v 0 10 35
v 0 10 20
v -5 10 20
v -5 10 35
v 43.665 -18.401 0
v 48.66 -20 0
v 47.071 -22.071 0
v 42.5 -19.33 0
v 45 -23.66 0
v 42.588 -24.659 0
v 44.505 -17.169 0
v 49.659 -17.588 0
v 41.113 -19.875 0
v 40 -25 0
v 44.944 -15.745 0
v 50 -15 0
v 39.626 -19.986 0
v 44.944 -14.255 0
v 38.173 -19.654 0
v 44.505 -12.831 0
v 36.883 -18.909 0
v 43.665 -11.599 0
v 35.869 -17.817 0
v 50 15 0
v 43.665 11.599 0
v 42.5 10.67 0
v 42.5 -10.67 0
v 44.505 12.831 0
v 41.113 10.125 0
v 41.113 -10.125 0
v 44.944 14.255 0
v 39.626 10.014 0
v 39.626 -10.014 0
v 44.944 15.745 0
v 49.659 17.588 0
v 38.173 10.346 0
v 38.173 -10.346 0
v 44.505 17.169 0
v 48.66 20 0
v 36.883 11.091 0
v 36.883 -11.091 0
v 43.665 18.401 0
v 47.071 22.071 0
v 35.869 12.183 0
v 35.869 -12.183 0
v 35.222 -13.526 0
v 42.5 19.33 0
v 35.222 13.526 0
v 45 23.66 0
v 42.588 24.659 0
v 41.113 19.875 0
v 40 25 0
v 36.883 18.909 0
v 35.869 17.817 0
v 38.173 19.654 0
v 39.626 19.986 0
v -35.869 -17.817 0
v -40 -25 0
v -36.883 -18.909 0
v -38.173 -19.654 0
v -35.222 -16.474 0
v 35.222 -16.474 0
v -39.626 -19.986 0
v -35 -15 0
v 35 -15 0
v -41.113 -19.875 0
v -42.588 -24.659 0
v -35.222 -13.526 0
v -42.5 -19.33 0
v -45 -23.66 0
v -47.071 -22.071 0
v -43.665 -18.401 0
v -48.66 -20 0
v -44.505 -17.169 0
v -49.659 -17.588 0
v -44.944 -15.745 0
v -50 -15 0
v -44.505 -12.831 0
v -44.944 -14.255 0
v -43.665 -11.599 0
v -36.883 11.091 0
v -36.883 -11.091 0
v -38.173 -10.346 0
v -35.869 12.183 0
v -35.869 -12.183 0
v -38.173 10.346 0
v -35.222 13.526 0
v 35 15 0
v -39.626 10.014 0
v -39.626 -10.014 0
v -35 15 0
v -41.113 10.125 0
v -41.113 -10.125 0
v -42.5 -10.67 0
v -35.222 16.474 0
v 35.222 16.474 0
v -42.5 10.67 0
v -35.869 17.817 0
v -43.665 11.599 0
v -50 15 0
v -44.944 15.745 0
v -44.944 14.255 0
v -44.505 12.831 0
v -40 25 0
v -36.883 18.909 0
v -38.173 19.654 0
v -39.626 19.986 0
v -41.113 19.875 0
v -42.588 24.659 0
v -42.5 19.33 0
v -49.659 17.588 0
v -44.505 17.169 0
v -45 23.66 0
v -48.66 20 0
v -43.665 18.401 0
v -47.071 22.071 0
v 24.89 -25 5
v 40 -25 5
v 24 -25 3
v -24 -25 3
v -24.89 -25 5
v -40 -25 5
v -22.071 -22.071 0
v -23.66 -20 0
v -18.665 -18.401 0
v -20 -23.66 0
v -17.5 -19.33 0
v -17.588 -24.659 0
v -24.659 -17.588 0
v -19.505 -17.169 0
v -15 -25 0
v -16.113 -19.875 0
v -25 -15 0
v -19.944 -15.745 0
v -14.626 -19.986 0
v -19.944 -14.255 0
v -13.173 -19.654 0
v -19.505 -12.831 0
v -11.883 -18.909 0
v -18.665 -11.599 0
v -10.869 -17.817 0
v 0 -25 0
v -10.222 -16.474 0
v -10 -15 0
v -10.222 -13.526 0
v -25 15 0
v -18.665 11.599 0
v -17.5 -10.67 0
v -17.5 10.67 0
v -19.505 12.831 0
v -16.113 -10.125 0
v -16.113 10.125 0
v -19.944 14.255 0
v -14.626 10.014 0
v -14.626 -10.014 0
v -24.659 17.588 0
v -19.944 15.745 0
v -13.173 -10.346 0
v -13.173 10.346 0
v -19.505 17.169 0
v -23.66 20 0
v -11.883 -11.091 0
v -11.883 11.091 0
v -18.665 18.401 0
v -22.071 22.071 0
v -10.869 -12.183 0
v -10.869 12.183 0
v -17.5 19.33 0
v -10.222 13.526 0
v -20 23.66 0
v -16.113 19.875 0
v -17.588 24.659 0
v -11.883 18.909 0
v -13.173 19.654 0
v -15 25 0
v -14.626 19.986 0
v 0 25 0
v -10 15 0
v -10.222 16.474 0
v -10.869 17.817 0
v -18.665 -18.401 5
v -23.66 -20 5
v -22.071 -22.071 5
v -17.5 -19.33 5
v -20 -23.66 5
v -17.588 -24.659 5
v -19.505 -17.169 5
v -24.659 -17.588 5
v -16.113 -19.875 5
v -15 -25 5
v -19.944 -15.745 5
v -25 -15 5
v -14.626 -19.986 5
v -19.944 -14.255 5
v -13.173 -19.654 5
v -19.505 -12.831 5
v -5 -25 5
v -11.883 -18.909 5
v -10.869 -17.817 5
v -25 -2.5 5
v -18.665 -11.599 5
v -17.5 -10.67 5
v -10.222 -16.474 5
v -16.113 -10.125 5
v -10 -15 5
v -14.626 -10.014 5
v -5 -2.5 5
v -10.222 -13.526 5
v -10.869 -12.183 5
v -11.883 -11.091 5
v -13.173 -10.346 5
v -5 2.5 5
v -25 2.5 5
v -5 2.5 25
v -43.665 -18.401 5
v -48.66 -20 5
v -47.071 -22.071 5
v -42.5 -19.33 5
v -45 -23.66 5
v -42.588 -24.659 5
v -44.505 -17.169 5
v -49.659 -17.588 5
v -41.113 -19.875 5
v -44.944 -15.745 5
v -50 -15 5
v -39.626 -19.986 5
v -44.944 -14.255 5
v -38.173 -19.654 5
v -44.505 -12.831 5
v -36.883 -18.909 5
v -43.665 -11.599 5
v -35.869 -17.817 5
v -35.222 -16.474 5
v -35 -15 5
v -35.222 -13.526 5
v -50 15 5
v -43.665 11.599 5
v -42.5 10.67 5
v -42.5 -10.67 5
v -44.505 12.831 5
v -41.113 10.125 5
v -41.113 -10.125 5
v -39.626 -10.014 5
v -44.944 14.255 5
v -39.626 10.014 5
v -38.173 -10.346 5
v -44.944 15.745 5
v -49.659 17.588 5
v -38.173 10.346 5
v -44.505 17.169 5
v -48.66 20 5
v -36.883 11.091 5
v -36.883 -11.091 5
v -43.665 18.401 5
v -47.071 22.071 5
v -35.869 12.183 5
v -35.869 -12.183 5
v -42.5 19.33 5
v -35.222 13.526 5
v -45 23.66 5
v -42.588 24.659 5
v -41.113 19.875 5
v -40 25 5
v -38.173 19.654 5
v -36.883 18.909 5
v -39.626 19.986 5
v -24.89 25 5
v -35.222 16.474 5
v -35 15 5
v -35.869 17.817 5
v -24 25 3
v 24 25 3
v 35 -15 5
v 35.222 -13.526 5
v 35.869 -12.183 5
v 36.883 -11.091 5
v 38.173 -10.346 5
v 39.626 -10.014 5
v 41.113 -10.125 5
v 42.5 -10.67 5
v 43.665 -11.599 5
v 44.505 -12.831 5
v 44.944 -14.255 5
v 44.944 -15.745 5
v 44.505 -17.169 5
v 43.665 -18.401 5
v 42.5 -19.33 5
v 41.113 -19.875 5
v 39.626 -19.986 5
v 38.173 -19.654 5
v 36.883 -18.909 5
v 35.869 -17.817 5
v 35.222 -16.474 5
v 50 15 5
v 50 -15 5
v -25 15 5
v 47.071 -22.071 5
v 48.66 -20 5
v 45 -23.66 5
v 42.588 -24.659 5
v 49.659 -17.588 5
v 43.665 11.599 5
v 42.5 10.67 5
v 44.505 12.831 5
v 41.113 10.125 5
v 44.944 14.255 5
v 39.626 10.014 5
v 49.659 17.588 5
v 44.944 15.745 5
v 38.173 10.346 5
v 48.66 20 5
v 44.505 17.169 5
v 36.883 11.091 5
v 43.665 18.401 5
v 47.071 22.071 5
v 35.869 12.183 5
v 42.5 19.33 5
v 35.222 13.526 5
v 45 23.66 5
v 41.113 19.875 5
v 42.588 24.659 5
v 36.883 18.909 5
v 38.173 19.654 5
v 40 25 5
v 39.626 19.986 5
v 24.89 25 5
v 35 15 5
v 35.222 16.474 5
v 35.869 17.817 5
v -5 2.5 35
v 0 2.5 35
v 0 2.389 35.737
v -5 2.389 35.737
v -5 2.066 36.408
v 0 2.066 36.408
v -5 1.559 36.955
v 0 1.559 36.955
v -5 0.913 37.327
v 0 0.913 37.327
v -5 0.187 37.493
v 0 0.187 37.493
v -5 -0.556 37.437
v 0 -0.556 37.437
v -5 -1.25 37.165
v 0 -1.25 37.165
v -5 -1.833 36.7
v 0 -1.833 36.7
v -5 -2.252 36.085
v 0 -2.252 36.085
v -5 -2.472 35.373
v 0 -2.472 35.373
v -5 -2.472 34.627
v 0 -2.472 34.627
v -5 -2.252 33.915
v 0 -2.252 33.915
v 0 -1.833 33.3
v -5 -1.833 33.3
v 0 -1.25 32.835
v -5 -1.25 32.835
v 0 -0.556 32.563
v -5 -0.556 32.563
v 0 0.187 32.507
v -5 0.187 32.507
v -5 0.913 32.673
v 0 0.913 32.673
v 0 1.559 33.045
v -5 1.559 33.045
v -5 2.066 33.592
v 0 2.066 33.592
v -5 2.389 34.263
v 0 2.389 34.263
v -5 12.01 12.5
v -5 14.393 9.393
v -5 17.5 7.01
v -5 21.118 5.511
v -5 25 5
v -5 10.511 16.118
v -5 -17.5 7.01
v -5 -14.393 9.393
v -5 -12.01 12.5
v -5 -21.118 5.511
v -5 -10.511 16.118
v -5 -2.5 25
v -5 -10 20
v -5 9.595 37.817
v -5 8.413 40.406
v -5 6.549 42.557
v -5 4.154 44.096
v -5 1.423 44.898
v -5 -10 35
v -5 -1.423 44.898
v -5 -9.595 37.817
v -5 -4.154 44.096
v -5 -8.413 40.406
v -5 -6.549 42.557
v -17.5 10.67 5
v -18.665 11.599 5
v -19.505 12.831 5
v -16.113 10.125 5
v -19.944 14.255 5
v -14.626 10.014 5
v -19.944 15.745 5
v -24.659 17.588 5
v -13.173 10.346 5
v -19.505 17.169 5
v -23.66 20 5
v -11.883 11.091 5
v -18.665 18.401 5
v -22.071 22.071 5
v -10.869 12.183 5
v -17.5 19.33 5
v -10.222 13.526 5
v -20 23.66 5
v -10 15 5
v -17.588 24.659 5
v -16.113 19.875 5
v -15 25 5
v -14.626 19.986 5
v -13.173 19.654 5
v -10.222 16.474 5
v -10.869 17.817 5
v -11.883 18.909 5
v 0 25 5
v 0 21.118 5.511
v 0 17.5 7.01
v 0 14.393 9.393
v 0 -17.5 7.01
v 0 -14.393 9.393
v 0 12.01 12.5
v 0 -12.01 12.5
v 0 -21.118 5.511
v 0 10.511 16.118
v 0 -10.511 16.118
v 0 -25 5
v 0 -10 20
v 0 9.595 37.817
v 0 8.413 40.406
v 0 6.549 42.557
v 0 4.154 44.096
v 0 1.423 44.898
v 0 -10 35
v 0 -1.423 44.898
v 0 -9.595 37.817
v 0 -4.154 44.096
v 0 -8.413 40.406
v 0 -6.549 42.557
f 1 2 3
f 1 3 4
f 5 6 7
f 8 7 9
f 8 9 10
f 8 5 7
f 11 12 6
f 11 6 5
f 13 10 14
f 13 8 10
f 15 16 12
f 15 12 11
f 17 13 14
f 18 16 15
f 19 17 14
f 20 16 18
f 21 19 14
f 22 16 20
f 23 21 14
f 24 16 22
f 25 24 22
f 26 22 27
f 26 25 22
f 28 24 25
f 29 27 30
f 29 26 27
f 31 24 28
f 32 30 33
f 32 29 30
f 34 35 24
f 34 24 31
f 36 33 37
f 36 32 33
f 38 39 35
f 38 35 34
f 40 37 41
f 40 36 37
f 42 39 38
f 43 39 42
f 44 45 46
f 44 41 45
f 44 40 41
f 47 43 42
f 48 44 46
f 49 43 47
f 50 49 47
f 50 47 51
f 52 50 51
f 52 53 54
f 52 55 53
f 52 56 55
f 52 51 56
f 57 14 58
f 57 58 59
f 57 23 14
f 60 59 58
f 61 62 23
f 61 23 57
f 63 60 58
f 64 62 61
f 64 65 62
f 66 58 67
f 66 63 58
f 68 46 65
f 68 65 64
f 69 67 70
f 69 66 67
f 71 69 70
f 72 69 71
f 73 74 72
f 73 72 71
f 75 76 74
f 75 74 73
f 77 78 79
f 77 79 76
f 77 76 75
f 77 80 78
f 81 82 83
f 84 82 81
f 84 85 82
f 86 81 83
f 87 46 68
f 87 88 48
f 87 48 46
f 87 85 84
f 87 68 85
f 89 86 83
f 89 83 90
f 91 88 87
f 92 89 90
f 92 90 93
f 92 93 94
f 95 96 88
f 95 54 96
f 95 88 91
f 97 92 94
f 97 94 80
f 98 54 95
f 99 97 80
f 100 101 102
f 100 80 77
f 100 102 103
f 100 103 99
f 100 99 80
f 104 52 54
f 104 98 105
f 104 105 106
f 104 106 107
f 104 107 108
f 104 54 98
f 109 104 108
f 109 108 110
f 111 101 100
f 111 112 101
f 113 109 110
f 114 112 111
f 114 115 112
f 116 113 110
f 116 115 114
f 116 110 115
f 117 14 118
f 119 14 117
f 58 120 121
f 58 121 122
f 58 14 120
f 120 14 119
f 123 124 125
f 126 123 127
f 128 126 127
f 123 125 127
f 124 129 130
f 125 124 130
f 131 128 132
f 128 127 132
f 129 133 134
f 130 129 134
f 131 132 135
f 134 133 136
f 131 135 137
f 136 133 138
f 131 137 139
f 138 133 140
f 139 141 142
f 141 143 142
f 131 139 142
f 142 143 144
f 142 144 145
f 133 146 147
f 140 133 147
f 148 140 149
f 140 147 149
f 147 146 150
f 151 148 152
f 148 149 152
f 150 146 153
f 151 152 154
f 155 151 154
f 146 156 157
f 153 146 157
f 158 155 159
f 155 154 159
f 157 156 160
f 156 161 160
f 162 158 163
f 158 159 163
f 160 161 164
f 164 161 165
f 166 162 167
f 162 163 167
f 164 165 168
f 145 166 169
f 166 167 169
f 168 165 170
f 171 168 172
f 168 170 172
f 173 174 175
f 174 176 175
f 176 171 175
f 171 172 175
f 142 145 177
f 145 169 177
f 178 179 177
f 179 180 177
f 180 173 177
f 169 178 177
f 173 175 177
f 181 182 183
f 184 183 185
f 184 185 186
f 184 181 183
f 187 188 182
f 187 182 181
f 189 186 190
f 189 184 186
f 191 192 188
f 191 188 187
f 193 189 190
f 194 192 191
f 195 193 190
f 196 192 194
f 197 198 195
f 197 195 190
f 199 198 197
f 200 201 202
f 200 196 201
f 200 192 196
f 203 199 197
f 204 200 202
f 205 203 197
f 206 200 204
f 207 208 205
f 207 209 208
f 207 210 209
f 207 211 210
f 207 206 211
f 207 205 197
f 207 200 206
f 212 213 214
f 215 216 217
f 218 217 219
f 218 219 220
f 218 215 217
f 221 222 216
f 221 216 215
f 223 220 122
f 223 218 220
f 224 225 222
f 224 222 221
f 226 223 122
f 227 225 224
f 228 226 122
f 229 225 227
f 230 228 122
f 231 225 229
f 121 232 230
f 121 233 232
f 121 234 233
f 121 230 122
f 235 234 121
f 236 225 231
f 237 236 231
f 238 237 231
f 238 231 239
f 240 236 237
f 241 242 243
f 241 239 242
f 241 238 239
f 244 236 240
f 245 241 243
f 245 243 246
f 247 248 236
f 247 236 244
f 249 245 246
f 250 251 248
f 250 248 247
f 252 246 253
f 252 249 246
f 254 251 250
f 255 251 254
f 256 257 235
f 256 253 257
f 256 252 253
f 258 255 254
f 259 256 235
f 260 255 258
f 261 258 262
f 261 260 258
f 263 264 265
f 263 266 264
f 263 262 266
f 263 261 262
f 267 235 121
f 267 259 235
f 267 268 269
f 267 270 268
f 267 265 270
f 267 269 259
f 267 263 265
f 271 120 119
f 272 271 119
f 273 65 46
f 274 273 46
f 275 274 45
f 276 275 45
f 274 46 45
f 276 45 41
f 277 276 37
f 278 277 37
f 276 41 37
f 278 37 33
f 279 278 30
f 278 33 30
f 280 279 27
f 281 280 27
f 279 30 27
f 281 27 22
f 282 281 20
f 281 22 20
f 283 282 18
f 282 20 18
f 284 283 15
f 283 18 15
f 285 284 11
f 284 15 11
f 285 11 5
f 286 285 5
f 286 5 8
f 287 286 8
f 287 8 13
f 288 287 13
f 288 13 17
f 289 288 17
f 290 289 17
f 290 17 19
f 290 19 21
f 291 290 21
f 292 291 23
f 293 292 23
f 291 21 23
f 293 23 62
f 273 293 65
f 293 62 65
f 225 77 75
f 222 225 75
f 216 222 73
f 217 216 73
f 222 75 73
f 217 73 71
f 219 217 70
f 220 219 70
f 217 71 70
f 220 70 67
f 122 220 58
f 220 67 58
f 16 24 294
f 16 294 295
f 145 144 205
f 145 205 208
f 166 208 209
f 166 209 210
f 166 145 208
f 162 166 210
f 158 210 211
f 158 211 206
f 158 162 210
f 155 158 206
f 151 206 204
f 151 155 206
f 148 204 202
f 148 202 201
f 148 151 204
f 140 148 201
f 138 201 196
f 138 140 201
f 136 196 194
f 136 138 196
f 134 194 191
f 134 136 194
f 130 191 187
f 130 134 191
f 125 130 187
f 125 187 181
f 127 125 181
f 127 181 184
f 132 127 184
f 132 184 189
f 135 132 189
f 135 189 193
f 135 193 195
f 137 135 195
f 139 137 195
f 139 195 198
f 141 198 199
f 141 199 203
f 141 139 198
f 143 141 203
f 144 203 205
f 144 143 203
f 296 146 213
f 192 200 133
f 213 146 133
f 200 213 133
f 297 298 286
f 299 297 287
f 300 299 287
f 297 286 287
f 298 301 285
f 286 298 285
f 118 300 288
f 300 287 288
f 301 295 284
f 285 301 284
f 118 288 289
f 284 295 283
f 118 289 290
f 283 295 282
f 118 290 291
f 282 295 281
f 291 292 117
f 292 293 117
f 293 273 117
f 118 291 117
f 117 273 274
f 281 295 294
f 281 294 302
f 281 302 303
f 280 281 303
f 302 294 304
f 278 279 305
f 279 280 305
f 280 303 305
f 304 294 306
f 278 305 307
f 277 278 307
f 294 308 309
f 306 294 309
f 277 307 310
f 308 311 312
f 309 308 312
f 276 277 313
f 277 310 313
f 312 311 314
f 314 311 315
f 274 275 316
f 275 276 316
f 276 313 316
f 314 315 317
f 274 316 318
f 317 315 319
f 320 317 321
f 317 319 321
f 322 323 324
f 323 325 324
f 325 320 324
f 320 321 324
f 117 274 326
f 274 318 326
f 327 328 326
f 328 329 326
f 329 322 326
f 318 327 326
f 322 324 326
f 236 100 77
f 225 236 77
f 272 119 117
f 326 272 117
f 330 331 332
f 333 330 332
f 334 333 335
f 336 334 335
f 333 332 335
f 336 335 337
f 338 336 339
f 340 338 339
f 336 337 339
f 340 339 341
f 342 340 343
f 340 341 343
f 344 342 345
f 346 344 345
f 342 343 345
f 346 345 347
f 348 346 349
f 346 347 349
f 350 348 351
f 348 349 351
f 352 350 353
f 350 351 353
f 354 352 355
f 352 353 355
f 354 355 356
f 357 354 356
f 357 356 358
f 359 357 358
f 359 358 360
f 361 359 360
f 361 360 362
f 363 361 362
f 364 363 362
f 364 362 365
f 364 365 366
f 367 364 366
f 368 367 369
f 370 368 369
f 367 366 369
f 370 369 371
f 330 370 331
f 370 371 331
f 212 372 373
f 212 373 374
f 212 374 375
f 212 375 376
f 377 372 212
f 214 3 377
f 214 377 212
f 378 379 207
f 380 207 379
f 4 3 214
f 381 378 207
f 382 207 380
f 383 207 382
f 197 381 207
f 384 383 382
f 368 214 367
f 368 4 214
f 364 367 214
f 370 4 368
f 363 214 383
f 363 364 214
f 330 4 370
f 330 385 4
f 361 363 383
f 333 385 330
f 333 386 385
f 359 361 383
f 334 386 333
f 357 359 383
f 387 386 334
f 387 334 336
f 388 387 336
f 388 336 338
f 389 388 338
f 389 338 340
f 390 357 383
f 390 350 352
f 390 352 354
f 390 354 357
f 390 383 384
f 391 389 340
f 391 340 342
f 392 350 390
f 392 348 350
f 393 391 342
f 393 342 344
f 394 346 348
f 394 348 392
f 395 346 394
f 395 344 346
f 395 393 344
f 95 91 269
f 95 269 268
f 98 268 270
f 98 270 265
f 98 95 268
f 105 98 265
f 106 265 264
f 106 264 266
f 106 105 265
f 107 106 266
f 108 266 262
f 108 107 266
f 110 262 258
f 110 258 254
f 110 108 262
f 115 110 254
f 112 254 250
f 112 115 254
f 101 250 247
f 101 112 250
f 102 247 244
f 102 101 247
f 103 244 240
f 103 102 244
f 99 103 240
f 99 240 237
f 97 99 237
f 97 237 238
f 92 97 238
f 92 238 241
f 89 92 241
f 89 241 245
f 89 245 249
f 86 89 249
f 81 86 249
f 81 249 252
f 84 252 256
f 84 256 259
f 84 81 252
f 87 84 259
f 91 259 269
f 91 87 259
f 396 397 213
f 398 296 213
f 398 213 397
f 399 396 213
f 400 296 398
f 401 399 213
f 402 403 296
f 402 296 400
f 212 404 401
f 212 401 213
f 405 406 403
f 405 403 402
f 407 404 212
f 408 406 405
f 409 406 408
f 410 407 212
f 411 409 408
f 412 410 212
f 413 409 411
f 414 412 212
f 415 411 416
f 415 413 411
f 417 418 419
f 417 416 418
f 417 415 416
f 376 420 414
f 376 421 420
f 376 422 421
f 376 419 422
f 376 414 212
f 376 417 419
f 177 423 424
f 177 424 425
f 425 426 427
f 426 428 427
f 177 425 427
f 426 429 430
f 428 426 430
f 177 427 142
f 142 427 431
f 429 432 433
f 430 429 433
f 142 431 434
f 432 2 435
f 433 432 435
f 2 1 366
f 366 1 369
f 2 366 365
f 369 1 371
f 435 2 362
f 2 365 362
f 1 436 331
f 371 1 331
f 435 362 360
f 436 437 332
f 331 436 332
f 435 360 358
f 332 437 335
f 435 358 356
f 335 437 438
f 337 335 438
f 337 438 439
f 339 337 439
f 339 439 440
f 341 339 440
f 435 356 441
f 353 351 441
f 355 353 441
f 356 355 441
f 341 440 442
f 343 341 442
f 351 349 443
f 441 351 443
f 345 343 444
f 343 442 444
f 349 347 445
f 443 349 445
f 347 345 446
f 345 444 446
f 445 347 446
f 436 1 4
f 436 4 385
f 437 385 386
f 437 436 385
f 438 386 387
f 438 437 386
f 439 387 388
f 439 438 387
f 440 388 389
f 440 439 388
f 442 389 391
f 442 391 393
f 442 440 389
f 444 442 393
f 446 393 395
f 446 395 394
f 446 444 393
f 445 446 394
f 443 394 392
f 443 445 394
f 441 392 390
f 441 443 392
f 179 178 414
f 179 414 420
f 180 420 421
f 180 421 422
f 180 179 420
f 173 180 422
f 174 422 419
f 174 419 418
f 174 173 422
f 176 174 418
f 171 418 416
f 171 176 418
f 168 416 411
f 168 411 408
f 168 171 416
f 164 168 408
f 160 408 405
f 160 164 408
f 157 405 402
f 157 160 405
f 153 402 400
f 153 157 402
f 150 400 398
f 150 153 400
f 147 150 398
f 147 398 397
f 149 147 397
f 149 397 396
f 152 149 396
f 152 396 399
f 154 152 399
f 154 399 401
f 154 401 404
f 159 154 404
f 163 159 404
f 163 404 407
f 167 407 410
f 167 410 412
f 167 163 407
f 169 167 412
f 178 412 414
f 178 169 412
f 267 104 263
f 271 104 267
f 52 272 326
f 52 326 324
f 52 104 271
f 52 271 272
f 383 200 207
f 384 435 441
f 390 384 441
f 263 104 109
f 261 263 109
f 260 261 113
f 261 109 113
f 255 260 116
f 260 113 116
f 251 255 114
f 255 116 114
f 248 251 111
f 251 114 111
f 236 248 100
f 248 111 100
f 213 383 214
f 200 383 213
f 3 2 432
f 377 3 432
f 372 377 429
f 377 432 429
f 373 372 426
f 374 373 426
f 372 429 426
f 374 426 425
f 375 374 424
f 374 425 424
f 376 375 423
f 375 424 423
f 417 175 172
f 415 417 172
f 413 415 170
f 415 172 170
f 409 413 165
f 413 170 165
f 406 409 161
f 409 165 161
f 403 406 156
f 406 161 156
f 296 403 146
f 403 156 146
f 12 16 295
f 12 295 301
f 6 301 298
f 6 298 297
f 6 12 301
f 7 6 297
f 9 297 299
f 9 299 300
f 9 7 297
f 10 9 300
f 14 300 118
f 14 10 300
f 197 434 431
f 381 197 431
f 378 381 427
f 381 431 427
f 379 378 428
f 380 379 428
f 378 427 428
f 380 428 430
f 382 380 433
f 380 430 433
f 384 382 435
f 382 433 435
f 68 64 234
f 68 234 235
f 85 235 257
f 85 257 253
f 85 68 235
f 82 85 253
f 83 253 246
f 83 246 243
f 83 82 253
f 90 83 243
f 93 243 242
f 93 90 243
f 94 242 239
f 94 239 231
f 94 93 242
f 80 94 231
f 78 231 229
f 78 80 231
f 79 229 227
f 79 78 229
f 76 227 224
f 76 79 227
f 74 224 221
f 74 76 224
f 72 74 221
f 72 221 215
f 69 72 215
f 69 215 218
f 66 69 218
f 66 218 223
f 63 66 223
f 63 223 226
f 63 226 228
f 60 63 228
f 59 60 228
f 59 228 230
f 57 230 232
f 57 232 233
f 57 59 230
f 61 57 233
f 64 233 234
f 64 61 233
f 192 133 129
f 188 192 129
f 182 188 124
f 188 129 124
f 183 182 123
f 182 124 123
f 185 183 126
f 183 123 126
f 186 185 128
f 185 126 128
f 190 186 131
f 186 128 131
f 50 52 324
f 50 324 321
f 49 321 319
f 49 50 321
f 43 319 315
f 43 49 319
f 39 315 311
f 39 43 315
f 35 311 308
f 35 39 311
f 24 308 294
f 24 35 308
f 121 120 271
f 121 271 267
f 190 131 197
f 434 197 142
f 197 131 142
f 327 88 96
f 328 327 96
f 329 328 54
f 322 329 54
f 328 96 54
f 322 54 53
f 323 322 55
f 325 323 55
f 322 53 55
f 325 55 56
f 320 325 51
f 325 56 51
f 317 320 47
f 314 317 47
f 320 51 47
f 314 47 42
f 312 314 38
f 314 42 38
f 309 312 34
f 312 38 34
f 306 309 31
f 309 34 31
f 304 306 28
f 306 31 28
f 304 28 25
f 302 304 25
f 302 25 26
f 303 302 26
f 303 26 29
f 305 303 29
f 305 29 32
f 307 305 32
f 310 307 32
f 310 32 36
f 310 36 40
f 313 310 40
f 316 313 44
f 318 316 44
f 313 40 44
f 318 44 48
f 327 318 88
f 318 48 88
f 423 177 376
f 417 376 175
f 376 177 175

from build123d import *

# Parameters (mm, degrees)
SKETCH_R          = 5
PAD_DEPTH         = 5
POCKET_DEPTH      = 25.001
POCKET_DEPTH_BACK = 25.001
SKETCH002_R       = 5
PAD001_DEPTH      = 5
SKETCH003_R       = 2.5
PAD002_DEPTH      = 5
PAD003_DEPTH      = 2.5


with BuildPart() as base:
    # Sketch → Pad (new body)
    with BuildSketch(Plane.XY):
        with BuildLine():
            Line((-50, 15), (-50, -15))
            ThreePointArc((-50, -15), (-47.071068, -22.071068), (-40, -25))
            Line((-40, -25), (0, -25))
            Line((0, -25), (0, 25))
            Line((0, 25), (-40, 25))
            ThreePointArc((-40, 25), (-47.071068, 22.071068), (-50, 15))
        make_face()
        with Locations((-40, 15)):
            Circle(SKETCH_R, mode=Mode.SUBTRACT)
        with Locations((-40, -15)):
            Circle(SKETCH_R, mode=Mode.SUBTRACT)
    extrude(amount=PAD_DEPTH)

    # Sketch001 → Pocket (cut, two sides)
    with BuildSketch(Plane.XZ) as pocket_sk:
        Polygon((0, 3), (-24, 3), (-24.890457, 5), (0, 5), align=None)
    extrude(amount=-POCKET_DEPTH, mode=Mode.SUBTRACT)
    extrude(pocket_sk.sketch, amount=POCKET_DEPTH_BACK, mode=Mode.SUBTRACT)

    # Mirrored: Base across YZ


with BuildPart() as base_1:
    add(base.part)
    add(base.part.mirror(Plane.YZ))


with BuildPart() as bracket:
    # Sketch002 → Pad001 (new body)
    with BuildSketch(Plane.XY):
        with BuildLine():
            Line((0, 25), (-15, 25))
            ThreePointArc((-15, 25), (-22.071068, 22.071068), (-25, 15))
            Line((-25, 15), (-25, -15))
            ThreePointArc((-25, -15), (-22.071068, -22.071068), (-15, -25))
            Line((-15, -25), (0, -25))
            Line((0, -25), (0, 25))
        make_face()
        with Locations((-15, 15)):
            Circle(SKETCH002_R, mode=Mode.SUBTRACT)
        with Locations((-15, -15)):
            Circle(SKETCH002_R, mode=Mode.SUBTRACT)
    extrude(amount=PAD001_DEPTH)

    # Sketch003 → Pad002 (join)
    with BuildSketch(Plane.YZ):
        with BuildLine():
            ThreePointArc((-25, 5), (-14.393398, 9.393398), (-10, 20))
            Line((-10, 20), (-10, 35))
            ThreePointArc((10, 35), (0, 45), (-10, 35))
            Line((10, 20), (10, 35))
            ThreePointArc((10, 20), (14.393398, 9.393398), (25, 5))
            Line((-25, 5), (25, 5))
        make_face()
        with Locations((0, 35)):
            Circle(SKETCH003_R, mode=Mode.SUBTRACT)
    extrude(amount=-PAD002_DEPTH)

    # Sketch004 → Pad003 (join, symmetric)
    with BuildSketch(Plane.XZ):
        Polygon((-25, 5), (-5, 5), (-5, 25), align=None)
    extrude(amount=PAD003_DEPTH, both=True)


solid = Compound([base_1.part, bracket.part])
